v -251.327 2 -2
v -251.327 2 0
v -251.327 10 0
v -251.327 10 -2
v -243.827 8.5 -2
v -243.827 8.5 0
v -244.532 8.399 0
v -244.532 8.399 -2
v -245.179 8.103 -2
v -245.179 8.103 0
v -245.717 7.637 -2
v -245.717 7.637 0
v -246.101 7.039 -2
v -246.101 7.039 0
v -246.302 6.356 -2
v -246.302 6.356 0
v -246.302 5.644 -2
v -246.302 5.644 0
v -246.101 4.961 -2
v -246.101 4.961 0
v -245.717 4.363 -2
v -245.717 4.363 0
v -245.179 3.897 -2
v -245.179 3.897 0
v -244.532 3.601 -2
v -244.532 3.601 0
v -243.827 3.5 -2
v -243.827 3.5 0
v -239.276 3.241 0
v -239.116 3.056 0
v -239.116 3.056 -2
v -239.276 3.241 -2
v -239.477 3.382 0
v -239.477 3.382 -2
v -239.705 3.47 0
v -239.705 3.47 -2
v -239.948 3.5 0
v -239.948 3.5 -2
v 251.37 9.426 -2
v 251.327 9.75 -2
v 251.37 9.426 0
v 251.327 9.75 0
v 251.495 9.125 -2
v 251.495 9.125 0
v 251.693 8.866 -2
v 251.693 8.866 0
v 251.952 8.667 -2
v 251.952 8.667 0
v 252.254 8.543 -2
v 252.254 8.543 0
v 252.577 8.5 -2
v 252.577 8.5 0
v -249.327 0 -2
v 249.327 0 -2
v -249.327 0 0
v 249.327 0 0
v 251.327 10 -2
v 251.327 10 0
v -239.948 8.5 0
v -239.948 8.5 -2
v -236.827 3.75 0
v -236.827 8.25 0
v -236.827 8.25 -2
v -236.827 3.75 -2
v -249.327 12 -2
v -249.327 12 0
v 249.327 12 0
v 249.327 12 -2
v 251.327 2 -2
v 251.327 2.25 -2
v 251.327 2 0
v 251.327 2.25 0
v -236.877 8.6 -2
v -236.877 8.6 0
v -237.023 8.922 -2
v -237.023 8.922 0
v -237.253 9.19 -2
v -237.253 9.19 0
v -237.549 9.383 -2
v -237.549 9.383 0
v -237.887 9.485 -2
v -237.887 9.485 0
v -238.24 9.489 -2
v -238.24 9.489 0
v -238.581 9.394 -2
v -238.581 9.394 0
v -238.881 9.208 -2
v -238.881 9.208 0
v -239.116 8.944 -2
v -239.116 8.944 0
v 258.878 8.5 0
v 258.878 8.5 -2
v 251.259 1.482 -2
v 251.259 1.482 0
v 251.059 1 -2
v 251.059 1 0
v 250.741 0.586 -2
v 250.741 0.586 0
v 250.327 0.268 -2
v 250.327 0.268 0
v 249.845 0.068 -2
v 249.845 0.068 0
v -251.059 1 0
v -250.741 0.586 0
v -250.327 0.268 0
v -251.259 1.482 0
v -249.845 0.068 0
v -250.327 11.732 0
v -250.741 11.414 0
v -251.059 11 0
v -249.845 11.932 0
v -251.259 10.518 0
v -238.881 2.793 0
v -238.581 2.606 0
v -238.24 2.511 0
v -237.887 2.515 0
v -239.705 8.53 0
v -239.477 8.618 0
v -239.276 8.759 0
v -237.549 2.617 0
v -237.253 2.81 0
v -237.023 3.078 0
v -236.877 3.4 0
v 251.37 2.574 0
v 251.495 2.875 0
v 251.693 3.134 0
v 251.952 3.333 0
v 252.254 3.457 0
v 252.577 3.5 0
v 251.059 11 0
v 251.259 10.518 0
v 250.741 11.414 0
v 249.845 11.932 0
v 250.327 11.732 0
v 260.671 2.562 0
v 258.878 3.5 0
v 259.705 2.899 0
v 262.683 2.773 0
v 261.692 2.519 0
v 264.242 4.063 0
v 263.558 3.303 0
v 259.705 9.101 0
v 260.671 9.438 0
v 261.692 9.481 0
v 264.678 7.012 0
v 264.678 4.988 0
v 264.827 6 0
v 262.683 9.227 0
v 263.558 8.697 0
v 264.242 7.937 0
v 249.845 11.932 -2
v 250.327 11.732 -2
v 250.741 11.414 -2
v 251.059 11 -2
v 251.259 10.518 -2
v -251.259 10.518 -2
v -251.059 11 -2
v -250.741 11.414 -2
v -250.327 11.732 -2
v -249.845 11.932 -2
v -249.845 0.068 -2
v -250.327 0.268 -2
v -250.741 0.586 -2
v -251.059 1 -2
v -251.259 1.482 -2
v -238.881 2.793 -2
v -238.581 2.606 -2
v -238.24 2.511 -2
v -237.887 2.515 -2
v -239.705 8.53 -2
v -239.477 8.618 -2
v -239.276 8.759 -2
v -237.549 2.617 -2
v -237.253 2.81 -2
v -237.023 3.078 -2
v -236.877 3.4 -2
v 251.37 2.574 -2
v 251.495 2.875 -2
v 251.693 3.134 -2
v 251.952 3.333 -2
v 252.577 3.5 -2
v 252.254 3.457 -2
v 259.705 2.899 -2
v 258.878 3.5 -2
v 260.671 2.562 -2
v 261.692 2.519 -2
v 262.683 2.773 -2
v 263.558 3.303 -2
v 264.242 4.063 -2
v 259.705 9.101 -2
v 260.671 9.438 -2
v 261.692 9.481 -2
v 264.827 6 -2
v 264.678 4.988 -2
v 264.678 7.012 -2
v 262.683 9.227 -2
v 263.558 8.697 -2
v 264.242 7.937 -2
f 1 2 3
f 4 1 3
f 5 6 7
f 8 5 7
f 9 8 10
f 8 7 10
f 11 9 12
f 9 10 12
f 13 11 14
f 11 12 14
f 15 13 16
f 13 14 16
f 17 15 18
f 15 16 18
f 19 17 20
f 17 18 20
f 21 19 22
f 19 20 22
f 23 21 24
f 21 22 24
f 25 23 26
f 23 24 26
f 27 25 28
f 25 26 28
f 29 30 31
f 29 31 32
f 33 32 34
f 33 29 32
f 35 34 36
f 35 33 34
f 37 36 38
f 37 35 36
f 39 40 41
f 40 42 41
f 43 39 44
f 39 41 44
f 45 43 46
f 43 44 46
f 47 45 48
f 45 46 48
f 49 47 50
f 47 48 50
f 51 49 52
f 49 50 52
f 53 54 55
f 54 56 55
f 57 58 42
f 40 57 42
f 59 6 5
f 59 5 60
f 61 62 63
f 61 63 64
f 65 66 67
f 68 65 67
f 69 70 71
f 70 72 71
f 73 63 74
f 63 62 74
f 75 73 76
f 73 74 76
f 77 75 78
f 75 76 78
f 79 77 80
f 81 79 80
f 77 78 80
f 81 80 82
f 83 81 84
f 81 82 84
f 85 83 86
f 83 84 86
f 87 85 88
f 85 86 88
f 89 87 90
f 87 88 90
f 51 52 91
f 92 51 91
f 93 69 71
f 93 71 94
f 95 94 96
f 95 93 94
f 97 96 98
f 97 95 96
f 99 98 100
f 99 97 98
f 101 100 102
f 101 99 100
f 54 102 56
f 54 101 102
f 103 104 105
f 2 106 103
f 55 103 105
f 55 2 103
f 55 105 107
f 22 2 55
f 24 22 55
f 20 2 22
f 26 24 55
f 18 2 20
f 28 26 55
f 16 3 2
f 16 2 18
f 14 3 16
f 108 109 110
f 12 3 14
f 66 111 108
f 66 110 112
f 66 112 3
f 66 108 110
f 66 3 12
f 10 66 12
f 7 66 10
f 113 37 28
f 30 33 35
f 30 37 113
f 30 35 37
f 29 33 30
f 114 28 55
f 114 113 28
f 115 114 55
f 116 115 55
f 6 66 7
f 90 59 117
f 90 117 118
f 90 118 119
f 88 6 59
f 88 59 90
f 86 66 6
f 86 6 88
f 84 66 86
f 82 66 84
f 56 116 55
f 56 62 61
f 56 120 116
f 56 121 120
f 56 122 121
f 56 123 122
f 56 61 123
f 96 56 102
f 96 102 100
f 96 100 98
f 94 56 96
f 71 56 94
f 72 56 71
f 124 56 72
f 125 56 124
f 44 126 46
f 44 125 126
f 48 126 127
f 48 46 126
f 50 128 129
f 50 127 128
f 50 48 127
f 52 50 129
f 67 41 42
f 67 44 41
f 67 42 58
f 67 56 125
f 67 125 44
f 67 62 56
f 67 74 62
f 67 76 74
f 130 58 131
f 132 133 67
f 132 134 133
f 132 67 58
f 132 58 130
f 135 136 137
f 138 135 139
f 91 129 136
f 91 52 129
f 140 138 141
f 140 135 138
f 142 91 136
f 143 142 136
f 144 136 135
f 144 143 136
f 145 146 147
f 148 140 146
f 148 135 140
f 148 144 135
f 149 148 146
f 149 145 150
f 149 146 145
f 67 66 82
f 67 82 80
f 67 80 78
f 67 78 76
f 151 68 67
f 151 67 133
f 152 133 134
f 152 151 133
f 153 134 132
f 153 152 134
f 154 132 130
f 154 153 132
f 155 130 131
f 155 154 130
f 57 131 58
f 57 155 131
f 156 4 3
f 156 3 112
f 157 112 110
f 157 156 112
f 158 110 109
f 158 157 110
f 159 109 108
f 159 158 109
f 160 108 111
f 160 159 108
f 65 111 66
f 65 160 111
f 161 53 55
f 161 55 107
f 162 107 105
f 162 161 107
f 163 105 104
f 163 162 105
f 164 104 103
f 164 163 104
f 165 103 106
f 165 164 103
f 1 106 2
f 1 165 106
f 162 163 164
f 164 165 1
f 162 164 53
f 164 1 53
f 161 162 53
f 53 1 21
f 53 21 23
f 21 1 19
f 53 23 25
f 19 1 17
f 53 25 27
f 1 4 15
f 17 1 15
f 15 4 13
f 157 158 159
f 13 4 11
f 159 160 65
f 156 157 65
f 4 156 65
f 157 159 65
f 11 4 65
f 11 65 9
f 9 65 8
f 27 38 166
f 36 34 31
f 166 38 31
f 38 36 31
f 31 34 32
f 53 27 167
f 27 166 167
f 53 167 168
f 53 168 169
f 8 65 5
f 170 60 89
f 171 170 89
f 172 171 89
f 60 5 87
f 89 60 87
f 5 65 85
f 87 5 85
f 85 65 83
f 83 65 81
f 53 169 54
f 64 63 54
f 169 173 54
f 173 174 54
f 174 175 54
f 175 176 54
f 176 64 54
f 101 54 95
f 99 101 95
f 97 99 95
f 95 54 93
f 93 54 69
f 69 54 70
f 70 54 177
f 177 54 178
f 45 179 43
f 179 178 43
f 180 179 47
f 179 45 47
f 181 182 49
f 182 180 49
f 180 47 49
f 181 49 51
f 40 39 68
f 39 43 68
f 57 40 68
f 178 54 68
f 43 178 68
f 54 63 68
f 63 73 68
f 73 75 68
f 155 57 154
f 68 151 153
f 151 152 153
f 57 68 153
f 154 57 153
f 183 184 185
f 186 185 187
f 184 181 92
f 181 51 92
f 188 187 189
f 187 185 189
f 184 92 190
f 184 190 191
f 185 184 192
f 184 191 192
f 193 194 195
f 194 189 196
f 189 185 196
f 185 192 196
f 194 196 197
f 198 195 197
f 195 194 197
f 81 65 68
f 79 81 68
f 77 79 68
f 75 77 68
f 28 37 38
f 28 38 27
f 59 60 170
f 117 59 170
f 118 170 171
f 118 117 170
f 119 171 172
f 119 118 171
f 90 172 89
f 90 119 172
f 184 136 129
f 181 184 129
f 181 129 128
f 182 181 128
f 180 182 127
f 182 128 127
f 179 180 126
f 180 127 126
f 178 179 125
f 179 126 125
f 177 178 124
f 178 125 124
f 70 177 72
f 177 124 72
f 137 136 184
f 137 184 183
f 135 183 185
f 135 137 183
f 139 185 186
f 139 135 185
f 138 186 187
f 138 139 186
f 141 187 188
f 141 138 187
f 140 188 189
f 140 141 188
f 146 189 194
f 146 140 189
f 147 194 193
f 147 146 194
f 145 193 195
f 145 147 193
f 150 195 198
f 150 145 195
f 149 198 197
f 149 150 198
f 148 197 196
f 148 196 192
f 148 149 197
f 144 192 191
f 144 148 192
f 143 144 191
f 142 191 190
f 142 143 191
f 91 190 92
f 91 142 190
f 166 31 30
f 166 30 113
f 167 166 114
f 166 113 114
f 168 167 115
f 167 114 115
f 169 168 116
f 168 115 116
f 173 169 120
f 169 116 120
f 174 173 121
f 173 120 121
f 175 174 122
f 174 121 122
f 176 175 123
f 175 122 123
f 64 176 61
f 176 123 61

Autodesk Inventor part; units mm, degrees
ref_plane "YZ Plane" through (0, 0, 0) normal (1, 0, 0) x (0, 1, 0)
ref_plane "XZ Plane" through (0, 0, 0) normal (0, 1, 0) x (-1, 0, 0)
ref_plane "XY Plane" through (0, 0, 0) normal (0, 0, 1) x (1, 0, 0)
sketch "Эскиз1" plane through (0, 0, 0) normal (0, 0, 1) x (1, 0, 0)
  line L0 (-251.3272, 12) -> (251.3272, 12)
  line L1 (251.3272, 12) -> (251.3272, 0)
  line L2 (251.3272, 0) -> (-251.3272, 0)
  line L3 (-251.3272, 0) -> (-251.3272, 12)
  point P0 (0, 0)
  point P1 (0, 0)
  dimension "d0" = 12
  dimension "d1" = 502.6544
extrude "Выдавливание1" add sketch "Эскиз1" against normal blind 2
sketch "Эскиз4" plane through (0, 0, 0) normal (0, 0, 1) x (1, 0, 0)
  arc A0 (-243.8272, 8.5) -> (-243.8272, 3.5) centre (-243.8272, 6) ccw projected
  line L0 (-243.8272, 8.5) -> (-239.948, 8.5) projected
  arc A1 (-239.948, 8.5) -> (-239.1165, 8.9444) centre (-239.948, 9.5) ccw projected
  arc A2 (-236.8272, 8.25) -> (-239.1165, 8.9444) centre (-238.0772, 8.25) ccw projected
  line L1 (-236.8272, 8.25) -> (-236.8272, 3.75) projected
  arc A3 (-239.1165, 3.0556) -> (-236.8272, 3.75) centre (-238.0772, 3.75) ccw projected
  arc A4 (-239.1165, 3.0556) -> (-239.948, 3.5) centre (-239.948, 2.5) ccw projected
  line L2 (-239.948, 3.5) -> (-243.8272, 3.5) projected
  arc A5 (217.9113, 0) -> (219.9113, 2) centre (217.9113, 2) ccw construction
  line L3 (219.9113, 2.25) -> (219.9113, 2) construction
  arc A6 (221.1613, 3.5) -> (219.9113, 2.25) centre (221.1613, 2.25) ccw construction
  line L4 (227.4618, 3.5) -> (221.1613, 3.5) construction
  arc A7 (227.4618, 3.5) -> (227.4618, 8.5) centre (229.9113, 6) ccw construction
  line L5 (221.1613, 8.5) -> (227.4618, 8.5) construction
  arc A8 (219.9113, 9.75) -> (221.1613, 8.5) centre (221.1613, 9.75) ccw construction
  line L6 (219.9113, 10) -> (219.9113, 9.75) construction
  arc A9 (219.9113, 10) -> (217.9113, 12) centre (217.9113, 10) ccw construction
  line L7 (-249.3272, 12) -> (217.9113, 12) construction
  arc A10 (-249.3272, 12) -> (-251.3272, 10) centre (-249.3272, 10) ccw construction
  line L8 (-251.3272, 2) -> (-251.3272, 10) construction
  arc A11 (-251.3272, 2) -> (-249.3272, 0) centre (-249.3272, 2) ccw construction
  line L9 (217.9113, 0) -> (-249.3272, 0) construction
  line L10 (252.5772, 8.5) -> (258.8777, 8.5) projected
  arc A12 (258.8777, 3.5) -> (258.8777, 8.5) centre (261.3272, 6) ccw projected
  line L11 (258.8777, 3.5) -> (252.5772, 3.5) projected
  arc A13 (252.5772, 3.5) -> (251.3272, 2.25) centre (252.5772, 2.25) ccw projected
  arc A14 (251.3272, 9.75) -> (252.5772, 8.5) centre (252.5772, 9.75) ccw projected
  line L12 (251.3272, 9.75) -> (251.3272, 2.25)
  line L13 (251.3272, 12) -> (251.3272, 0) construction
  point P0 (0, 0)
extrude "Выдавливание4" add sketch "Эскиз4" against normal up to surface (2 mm away) contours L10 A12 L11 A13 L12 A14
extrude "Выдавливание5" cut sketch "Эскиз4" against normal blind 10 contours L0 A1 A2 L1 A3 A4 L2 A0
fillet "Сопряжение2" radius 2 4 edges at (251.3272, 0, -1) (251.3272, 12, -1) (-251.3272, 0, -1) (-251.3272, 12, -1)
sketch "Эскиз2" plane through (0, 0, 0) normal (0, 0, 1) x (1, 0, 0)
  line L0 (-251.3272, 12) -> (251.3272, 12) projected
  line L1 (-251.3272, 0) -> (-251.3272, 12) projected
  line L2 (251.3272, 0) -> (-251.3272, 0) projected
  line L3 (251.3272, 12) -> (251.3272, 0) projected
  line L4 (0, 0) -> (0, 12)
properties part number "Пластина LED(New6)-развёртка"
